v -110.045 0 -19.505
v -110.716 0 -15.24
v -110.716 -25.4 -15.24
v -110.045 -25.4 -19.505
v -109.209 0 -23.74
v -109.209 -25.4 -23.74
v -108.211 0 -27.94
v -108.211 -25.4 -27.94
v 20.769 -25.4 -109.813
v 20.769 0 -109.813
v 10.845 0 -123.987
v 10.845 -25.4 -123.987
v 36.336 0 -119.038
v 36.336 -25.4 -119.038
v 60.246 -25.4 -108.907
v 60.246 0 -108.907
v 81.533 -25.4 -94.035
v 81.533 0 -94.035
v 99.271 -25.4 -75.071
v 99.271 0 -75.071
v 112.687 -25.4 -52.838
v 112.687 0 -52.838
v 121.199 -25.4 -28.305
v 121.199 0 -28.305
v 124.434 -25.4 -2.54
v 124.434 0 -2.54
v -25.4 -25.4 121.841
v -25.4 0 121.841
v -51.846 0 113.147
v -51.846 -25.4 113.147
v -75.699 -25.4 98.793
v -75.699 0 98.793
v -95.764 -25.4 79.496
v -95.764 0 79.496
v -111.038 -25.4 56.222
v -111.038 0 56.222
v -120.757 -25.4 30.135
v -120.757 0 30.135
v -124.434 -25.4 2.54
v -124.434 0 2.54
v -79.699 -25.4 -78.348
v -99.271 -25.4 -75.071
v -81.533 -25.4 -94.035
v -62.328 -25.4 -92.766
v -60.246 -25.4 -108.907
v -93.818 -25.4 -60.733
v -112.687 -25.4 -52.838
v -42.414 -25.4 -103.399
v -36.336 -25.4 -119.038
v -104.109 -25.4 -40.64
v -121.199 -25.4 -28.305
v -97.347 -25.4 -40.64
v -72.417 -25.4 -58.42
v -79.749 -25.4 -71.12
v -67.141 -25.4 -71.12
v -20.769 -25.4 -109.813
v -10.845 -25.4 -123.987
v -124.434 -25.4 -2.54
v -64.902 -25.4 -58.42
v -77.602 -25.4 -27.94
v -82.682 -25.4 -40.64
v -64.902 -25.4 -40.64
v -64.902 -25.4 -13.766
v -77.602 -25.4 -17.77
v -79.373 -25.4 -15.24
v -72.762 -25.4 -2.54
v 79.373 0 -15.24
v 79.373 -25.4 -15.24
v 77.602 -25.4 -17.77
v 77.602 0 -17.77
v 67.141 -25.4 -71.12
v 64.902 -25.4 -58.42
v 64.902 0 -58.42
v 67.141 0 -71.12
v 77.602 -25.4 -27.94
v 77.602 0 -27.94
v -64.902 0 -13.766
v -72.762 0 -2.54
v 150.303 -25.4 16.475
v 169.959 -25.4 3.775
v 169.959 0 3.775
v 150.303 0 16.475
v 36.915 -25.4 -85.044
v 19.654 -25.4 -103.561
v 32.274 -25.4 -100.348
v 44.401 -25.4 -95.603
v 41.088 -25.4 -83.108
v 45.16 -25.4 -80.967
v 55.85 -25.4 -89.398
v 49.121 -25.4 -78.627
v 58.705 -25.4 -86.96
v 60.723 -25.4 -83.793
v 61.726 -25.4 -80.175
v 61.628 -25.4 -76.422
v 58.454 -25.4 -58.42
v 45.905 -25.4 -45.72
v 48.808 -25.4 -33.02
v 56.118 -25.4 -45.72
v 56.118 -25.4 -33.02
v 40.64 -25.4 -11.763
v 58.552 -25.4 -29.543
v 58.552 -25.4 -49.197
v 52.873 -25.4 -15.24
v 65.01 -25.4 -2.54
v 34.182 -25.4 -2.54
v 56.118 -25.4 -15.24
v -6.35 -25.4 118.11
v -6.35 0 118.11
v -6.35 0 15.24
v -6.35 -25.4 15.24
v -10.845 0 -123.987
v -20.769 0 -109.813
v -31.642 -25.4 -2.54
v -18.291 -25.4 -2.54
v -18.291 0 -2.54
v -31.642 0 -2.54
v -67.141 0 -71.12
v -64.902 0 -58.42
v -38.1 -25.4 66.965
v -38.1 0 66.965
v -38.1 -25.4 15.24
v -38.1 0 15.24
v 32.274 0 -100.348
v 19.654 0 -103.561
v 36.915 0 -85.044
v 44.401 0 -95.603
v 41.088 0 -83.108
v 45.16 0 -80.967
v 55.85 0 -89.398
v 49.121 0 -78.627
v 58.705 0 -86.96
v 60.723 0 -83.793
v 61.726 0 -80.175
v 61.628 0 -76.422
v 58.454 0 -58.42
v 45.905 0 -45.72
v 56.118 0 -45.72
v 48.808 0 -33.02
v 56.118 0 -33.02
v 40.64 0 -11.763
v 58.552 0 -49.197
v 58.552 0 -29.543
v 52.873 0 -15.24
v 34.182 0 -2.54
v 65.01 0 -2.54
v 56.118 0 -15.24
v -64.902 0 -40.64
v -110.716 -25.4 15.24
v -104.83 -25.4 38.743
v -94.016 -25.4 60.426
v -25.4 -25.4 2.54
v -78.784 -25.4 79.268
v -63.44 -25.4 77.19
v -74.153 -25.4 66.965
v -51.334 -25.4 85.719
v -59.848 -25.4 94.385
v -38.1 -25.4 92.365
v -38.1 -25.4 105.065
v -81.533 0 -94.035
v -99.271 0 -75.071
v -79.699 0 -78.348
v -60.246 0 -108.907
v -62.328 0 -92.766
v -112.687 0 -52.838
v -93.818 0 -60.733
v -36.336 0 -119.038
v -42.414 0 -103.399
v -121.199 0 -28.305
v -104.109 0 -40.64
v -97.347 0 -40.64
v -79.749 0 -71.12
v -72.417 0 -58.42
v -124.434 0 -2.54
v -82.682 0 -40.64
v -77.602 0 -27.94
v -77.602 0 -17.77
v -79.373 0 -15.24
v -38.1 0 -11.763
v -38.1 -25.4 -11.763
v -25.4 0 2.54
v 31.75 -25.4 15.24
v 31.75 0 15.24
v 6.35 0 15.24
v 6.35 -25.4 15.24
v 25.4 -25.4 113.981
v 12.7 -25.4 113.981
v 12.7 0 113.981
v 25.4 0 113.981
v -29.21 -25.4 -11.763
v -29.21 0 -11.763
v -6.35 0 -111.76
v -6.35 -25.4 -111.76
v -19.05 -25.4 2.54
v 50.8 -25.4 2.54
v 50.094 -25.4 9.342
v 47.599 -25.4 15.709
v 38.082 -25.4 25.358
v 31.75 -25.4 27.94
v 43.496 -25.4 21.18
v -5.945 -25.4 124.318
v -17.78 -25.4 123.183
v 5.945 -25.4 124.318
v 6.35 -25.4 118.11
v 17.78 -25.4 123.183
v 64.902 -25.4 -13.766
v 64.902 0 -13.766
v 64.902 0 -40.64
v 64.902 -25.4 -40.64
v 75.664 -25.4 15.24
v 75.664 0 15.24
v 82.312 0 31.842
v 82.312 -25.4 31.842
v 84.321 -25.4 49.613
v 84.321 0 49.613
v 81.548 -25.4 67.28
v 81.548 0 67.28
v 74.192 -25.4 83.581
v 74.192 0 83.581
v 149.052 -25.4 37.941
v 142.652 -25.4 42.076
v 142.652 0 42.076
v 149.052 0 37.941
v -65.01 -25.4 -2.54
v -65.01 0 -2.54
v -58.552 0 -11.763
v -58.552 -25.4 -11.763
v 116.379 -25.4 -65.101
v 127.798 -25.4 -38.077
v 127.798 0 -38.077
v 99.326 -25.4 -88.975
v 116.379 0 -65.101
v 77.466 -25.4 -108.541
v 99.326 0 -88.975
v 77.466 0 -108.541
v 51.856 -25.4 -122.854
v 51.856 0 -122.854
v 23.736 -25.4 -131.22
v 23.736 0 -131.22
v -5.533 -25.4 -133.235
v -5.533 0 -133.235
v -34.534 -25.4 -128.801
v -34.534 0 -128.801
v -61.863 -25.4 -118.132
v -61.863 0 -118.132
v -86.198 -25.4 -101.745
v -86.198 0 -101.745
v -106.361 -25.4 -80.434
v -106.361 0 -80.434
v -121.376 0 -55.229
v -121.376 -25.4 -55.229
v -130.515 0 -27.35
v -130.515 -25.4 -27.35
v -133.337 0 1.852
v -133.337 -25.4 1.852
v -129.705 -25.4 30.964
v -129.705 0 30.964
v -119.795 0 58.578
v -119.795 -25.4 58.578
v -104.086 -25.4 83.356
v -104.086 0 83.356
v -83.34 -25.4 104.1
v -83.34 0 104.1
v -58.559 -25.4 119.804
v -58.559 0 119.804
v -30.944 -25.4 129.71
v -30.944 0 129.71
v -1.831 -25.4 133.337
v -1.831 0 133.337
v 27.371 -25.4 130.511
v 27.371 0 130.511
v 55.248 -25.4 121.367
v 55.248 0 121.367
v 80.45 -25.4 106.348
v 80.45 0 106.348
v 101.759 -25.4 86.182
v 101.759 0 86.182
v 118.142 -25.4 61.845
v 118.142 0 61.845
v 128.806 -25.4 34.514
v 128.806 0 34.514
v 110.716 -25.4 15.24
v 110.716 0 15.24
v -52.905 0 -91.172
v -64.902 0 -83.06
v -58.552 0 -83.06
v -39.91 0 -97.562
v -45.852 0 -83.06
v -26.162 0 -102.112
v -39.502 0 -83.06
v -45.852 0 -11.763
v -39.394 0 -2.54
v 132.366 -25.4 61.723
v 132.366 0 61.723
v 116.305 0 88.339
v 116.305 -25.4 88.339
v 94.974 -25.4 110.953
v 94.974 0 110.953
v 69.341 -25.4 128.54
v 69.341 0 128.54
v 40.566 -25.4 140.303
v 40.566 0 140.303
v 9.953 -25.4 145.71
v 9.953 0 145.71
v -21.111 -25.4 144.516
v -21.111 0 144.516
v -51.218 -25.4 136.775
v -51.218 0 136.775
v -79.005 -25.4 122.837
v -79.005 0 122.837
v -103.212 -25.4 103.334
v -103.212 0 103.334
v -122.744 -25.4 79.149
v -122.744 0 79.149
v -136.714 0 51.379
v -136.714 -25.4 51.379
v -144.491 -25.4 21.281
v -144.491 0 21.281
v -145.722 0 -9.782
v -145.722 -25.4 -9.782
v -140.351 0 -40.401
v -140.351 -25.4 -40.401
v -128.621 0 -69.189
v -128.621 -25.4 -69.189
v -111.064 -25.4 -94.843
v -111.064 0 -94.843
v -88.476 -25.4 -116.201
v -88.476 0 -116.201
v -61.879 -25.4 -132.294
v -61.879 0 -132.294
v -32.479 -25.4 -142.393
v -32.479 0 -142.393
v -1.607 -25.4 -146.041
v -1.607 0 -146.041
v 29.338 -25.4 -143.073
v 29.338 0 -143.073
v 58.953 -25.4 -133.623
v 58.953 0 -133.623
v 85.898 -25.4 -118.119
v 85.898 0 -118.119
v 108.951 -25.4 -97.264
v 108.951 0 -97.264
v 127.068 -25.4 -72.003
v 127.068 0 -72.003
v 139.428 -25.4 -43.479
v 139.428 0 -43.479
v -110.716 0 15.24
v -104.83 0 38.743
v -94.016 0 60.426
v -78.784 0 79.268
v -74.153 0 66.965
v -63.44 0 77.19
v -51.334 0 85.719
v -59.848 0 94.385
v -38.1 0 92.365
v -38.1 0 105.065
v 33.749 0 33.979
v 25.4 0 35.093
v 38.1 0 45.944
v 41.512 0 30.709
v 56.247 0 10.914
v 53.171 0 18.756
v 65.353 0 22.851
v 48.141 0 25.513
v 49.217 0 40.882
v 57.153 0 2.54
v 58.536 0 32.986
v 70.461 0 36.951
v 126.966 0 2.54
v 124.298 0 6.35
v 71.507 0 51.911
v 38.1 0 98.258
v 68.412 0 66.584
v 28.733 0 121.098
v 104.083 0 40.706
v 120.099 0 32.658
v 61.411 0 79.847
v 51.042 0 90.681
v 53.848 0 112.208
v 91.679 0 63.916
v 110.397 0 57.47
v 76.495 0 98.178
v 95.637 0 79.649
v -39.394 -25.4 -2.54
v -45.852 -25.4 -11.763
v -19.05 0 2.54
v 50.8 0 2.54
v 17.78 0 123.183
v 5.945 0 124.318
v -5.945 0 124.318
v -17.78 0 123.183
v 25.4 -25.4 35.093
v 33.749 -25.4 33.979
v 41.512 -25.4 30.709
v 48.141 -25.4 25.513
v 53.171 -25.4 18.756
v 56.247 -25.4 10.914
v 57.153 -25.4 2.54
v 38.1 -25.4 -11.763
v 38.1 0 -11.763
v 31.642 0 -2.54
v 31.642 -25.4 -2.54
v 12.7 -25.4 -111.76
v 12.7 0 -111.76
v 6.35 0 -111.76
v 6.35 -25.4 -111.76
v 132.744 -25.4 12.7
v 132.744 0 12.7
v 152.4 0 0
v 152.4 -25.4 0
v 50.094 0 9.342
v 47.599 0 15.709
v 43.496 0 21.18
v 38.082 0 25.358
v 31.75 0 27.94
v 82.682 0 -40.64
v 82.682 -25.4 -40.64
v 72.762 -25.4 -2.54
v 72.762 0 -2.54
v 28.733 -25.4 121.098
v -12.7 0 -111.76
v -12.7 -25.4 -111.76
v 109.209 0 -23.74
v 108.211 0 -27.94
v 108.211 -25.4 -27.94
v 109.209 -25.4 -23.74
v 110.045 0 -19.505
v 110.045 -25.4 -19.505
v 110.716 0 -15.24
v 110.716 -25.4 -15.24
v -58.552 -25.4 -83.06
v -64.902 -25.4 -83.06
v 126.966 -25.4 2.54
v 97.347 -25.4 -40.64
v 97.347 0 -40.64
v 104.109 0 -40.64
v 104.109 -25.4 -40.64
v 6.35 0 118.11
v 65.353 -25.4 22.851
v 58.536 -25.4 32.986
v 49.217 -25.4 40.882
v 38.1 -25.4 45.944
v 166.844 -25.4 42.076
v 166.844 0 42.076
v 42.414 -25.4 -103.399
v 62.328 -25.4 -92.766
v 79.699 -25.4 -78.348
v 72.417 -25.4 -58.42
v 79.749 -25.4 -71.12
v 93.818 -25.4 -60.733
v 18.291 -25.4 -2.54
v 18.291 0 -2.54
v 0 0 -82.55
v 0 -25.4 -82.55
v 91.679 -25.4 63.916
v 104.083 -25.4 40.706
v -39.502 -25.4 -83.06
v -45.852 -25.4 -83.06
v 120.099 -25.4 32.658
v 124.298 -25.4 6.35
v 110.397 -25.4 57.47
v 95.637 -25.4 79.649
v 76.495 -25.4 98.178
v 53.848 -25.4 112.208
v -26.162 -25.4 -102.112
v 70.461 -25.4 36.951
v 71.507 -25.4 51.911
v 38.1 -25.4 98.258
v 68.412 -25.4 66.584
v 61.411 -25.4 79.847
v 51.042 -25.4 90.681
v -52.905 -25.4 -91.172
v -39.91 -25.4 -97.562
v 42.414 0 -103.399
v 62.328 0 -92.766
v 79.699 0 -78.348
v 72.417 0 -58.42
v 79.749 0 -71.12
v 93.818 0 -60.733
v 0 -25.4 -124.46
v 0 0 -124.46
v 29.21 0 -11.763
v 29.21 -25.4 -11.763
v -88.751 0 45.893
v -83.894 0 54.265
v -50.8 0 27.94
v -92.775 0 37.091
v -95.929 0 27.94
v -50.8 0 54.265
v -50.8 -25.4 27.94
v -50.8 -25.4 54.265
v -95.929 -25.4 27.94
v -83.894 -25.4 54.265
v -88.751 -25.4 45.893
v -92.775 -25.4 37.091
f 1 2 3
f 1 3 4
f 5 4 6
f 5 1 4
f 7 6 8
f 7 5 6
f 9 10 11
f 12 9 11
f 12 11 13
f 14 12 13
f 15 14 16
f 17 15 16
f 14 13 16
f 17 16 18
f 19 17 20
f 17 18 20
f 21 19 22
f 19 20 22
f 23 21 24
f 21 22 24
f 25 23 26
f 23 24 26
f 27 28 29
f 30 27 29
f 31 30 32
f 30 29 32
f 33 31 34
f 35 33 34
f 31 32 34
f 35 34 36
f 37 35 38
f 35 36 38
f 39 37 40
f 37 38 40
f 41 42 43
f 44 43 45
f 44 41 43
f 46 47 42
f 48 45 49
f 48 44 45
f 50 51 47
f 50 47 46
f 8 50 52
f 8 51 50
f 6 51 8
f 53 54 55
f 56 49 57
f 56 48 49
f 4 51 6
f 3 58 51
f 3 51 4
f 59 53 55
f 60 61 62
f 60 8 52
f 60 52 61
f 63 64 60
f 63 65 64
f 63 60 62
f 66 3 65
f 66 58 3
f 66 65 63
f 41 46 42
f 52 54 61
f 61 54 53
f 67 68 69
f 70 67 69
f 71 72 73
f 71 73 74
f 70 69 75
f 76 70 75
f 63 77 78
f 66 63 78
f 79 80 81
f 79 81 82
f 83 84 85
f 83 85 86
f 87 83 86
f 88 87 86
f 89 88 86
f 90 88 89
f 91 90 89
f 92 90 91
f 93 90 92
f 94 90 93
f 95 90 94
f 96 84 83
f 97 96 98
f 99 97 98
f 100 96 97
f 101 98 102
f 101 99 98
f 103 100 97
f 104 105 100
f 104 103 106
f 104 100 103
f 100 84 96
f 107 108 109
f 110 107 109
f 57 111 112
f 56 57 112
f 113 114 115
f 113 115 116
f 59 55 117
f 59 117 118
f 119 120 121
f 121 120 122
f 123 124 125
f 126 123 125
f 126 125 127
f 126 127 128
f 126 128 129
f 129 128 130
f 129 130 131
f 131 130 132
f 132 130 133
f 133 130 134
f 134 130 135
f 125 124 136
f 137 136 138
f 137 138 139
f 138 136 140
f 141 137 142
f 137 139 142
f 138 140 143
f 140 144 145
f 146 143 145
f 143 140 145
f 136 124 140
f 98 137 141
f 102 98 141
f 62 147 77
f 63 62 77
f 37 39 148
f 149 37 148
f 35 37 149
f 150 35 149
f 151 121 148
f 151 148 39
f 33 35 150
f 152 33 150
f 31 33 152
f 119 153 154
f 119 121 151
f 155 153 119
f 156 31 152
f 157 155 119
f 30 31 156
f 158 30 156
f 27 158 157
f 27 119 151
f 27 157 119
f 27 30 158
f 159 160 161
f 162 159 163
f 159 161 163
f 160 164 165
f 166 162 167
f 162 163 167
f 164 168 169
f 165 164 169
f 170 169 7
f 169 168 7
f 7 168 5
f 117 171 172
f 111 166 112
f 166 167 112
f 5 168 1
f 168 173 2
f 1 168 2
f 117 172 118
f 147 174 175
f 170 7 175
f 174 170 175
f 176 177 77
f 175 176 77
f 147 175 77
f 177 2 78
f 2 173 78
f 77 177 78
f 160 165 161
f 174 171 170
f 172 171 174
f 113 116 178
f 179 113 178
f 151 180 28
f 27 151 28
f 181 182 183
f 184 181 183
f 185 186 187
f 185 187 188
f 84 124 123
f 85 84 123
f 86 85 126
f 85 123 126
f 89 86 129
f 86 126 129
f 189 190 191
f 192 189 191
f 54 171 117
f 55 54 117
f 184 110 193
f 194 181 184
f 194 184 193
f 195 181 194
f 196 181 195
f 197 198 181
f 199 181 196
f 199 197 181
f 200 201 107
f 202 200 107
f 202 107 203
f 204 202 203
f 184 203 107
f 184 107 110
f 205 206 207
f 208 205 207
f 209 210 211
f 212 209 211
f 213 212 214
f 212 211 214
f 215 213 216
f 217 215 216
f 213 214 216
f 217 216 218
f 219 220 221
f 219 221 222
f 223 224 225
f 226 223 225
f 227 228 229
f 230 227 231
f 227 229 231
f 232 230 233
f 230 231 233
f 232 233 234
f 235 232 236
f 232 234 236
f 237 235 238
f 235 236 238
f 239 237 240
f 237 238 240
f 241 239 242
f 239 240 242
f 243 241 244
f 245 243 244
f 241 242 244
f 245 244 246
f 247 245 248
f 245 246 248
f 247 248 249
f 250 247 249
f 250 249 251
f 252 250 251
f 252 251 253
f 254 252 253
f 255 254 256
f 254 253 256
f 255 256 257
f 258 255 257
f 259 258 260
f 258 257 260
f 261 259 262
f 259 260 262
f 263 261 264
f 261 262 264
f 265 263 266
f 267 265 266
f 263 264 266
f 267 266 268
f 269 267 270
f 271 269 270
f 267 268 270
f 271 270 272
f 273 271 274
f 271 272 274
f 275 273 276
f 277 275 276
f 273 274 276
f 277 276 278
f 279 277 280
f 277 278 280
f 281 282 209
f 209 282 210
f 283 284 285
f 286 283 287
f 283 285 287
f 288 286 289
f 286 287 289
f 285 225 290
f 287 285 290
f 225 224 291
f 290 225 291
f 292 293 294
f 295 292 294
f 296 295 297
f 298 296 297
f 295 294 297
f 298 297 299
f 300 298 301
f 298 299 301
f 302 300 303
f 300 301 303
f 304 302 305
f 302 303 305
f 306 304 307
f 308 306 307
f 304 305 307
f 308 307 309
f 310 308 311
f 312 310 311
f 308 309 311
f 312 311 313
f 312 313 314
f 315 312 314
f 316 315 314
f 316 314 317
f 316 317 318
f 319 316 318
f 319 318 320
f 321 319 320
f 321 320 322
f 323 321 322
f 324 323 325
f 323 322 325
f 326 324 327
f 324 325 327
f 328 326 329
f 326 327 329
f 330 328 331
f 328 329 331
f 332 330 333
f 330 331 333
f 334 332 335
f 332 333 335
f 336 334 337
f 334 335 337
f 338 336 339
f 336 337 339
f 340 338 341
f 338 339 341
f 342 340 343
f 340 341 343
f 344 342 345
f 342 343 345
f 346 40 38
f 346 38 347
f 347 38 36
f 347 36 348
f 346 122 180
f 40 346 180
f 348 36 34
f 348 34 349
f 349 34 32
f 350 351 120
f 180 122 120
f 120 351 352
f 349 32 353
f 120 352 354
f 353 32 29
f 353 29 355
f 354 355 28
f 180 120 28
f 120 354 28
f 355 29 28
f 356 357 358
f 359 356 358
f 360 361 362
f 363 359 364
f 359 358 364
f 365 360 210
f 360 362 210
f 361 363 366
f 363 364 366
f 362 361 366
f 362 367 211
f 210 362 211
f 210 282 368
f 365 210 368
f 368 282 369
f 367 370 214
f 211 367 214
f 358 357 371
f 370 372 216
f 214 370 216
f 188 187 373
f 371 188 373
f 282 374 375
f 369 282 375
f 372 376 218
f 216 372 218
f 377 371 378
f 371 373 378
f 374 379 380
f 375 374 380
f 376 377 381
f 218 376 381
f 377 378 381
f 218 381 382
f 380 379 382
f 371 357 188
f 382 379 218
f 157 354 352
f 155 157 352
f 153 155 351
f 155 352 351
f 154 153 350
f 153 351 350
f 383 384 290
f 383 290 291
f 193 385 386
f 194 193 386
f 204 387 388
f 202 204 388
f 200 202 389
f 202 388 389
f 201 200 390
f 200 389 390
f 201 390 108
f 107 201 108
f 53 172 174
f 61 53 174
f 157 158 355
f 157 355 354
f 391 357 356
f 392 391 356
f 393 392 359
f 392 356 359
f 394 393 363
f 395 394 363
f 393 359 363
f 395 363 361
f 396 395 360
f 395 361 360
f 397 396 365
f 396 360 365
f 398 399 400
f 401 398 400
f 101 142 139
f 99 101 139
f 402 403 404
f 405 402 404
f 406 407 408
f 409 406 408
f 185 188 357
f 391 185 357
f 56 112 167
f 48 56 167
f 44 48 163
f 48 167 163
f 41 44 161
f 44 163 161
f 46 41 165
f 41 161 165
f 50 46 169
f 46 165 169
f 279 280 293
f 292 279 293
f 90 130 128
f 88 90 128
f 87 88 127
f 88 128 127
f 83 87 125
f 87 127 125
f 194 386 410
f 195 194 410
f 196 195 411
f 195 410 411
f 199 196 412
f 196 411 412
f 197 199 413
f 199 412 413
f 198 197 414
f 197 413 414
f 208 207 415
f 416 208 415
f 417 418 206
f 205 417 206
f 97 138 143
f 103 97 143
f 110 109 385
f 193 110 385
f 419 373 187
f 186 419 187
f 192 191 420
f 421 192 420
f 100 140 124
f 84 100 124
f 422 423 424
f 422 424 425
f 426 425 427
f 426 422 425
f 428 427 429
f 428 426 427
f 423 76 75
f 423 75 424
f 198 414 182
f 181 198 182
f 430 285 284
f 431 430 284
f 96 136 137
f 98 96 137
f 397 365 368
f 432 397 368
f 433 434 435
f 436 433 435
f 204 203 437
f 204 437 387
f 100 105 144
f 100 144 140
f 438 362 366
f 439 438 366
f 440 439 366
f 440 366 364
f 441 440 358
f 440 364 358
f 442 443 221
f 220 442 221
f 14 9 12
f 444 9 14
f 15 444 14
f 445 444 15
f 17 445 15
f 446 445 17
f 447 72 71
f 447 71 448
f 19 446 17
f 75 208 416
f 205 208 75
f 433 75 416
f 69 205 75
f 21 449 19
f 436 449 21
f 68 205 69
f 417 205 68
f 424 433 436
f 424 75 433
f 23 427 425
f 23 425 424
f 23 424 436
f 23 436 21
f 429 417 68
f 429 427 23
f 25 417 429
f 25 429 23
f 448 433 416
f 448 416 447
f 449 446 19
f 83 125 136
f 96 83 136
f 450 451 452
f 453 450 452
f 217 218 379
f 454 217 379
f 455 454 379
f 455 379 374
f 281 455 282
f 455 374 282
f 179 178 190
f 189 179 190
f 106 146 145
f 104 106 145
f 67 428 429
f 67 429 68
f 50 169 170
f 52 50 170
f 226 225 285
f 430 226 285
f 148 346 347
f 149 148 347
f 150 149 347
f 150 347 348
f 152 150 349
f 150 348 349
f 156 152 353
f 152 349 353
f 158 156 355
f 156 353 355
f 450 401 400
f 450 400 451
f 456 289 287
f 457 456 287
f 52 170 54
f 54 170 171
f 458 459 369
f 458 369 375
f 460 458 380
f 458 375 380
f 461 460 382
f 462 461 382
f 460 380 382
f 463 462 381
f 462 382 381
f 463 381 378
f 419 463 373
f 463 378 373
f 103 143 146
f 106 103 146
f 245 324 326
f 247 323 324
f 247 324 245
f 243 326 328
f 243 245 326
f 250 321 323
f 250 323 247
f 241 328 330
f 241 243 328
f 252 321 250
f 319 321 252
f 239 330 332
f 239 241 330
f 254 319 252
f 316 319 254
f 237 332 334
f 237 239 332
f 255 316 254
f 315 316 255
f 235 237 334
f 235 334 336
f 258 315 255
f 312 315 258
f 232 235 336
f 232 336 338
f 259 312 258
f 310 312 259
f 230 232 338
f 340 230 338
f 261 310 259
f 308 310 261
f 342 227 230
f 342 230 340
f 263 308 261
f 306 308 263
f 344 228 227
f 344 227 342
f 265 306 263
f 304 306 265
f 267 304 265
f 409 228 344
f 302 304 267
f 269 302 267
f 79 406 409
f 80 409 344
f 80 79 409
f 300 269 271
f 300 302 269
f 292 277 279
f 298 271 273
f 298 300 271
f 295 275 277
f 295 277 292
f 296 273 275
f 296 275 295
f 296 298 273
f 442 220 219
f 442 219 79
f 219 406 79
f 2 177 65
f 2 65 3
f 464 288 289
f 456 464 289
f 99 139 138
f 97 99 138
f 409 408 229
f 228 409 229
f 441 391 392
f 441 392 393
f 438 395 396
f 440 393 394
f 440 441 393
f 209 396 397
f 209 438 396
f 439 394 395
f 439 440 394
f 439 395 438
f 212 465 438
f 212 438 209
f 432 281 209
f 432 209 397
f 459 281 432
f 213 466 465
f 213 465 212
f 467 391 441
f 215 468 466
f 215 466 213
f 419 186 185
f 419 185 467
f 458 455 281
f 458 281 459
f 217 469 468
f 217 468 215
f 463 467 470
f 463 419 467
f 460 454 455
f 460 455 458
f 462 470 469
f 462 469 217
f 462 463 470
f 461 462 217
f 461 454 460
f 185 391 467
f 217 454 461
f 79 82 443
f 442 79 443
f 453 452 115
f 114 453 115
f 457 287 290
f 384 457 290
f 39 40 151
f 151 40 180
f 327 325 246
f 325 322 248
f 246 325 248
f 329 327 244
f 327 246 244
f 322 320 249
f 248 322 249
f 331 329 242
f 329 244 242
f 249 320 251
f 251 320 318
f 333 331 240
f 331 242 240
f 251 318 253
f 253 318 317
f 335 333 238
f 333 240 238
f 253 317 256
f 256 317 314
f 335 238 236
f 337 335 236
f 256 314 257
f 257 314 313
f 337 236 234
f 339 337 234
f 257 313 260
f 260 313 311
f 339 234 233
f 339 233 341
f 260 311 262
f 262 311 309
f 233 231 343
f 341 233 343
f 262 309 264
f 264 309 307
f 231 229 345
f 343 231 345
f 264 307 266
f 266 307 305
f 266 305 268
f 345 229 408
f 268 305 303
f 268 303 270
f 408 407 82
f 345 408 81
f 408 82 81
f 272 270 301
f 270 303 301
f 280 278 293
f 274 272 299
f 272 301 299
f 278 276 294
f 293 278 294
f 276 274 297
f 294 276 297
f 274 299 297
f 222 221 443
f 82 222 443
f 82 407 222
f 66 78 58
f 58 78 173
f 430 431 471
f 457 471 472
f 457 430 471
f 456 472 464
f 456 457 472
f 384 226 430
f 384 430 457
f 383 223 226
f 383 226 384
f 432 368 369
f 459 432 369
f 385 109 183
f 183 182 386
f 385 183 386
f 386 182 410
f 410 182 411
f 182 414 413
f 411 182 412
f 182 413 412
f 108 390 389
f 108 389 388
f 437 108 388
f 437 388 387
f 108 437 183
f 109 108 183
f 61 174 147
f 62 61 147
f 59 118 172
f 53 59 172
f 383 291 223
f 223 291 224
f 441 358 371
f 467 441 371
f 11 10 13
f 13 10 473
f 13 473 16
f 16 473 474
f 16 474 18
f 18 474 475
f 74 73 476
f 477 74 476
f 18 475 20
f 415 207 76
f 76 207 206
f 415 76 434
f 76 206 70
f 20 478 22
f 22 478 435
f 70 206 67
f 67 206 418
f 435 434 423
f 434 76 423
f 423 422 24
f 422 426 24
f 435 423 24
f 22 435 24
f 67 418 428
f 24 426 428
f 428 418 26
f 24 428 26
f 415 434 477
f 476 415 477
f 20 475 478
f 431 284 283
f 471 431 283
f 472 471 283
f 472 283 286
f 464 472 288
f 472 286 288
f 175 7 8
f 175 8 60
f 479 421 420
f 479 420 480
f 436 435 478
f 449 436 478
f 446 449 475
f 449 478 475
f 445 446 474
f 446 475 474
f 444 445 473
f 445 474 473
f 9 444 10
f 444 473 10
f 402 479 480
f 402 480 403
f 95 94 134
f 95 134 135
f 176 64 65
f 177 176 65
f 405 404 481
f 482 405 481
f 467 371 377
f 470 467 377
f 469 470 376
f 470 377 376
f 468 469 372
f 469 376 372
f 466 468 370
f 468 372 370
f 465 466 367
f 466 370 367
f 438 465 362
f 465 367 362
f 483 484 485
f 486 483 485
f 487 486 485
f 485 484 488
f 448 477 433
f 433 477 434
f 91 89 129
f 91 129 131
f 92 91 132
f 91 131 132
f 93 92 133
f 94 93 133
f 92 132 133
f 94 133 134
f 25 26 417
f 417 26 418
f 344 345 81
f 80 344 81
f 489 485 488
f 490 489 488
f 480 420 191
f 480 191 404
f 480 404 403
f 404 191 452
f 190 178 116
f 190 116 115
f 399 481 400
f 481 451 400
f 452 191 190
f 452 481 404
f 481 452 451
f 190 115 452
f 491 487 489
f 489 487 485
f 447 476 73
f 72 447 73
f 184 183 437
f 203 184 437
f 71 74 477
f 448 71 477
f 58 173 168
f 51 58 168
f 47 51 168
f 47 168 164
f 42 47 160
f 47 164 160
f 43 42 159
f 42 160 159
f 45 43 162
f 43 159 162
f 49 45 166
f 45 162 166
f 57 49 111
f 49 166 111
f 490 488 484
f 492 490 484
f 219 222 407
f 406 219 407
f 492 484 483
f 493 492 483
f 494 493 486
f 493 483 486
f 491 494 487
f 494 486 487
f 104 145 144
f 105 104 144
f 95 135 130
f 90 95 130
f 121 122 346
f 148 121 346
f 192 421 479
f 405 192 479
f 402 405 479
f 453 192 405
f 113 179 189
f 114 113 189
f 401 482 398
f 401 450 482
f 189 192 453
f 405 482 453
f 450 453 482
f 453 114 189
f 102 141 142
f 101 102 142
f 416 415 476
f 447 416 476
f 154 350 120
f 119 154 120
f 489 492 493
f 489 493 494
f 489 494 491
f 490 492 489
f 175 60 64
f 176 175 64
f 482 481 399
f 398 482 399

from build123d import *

# Parameters (mm, degrees)
F3_DEPTH  = 25.4
F5_DEPTH  = 25.4
F6_DEPTH  = 25.4
F8_DEPTH  = 25.4
F10_DEPTH = 25.4
F12_DEPTH = 25.401
F14_DEPTH = 25.4
F16_DEPTH = 25.4
F18_DEPTH = 25.4
F20_R     = 84.4927612286
F21_DEPTH = 25.4


with BuildPart() as f3:
    # F1 (on Front) → F3 (new body)
    with BuildSketch(Plane.XZ):
        with BuildLine():
            ThreePointArc((-25.4, 121.8405991449), (-95.7638817172, 79.4957266679), (-124.4340789334, 2.54))
            Line((-124.4340789334, 2.54), (-25.4, 2.54))
            Line((-25.4, 2.54), (-25.4, 121.8405991449))
        make_face()
        with BuildLine():
            ThreePointArc((-110.7160331659, 15.24), (-86.9119826119, 70.2609769251), (-38.1, 105.0651588301))
            Line((-38.1, 105.0651588301), (-38.1, 92.3651588301))
            ThreePointArc((-38.1, 92.3651588301), (-57.5451867422, 81.679153084), (-74.1525459345, 66.9651588301))
            Line((-74.1525459345, 66.9651588301), (-38.1, 66.9651588301))
            Line((-38.1, 66.9651588301), (-38.1, 15.24))
            Line((-38.1, 15.24), (-110.7160331659, 15.24))
        make_face(mode=Mode.SUBTRACT)
    extrude(amount=F3_DEPTH)


with BuildPart() as f3b:
    # F1 (on Front) → F3, piece 2 (new body)
    with BuildSketch(Plane.XZ):
        with BuildLine():
            Line((6.35, 118.11), (17.78, 123.1834534343))
            ThreePointArc((17.78, 123.1834534343), (0, 124.46), (-17.78, 123.1834534343))
            Line((-17.78, 123.1834534343), (-6.35, 118.11))
            Line((-6.35, 118.11), (-6.35, 15.24))
            Line((-6.35, 15.24), (-19.05, 2.54))
            Line((-19.05, 2.54), (50.8, 2.54))
            ThreePointArc((50.8, 2.54), (45.7327050841, 18.5832788131), (31.75, 27.94))
            Line((31.75, 27.94), (31.75, 15.24))
            Line((31.75, 15.24), (6.35, 15.24))
            Line((6.35, 15.24), (6.35, 118.11))
        make_face()
    extrude(amount=F3_DEPTH)


with BuildPart() as f5:
    # F4 (on Front) → F5 (new body)
    with BuildSketch(Plane.XZ):
        with BuildLine():
            Line((-50.8, 27.94), (-50.8, 54.2651588301))
            Line((-50.8, 54.2651588301), (-83.8941303242, 54.2651588301))
            ThreePointArc((-83.8941303242, 54.2651588301), (-90.8697069766, 41.5406899281), (-95.9285617828, 27.94))
            Line((-95.9285617828, 27.94), (-50.8, 27.94))
        make_face()
    extrude(amount=F5_DEPTH)


with BuildPart() as f6:
    # F2 (on Front) → F6 (new body)
    with BuildSketch(Plane.XZ):
        with BuildLine():
            ThreePointArc((25.4, 35.093276271), (48.1411381908, 25.5126457077), (57.1525419322, 2.54))
            Line((57.1525419322, 2.54), (126.965695369, 2.54))
            Line((126.965695369, 2.54), (124.2979046485, 6.35))
            ThreePointArc((124.2979046485, 6.35), (95.636825538, 79.6485354606), (28.7332646793, 121.0978575404))
            Line((28.7332646793, 121.0978575404), (12.7, 113.9811452263))
            Line((12.7, 113.9811452263), (25.4, 113.9811452263))
            Line((25.4, 113.9811452263), (25.4, 35.093276271))
        make_face()
        with BuildLine():
            Line((38.1, 98.2576242415), (38.1, 105.0651588301))
            ThreePointArc((38.1, 105.0651588301), (57.1644375837, 96.0339766735), (74.1921715749, 83.5812136607))
            ThreePointArc((74.1921715749, 83.5812136607), (98.5666851237, 52.677378292), (110.7160331659, 15.24))
            Line((110.7160331659, 15.24), (75.6643674018, 15.24))
            Line((75.6643674018, 15.24), (68.2410896555, 15.24))
            ThreePointArc((68.2410896555, 15.24), (66.9718438263, 19.1116169311), (65.3534242126, 22.8507505995))
            ThreePointArc((65.3534242126, 22.8507505995), (54.1486294803, 37.2556533847), (38.1, 45.9441596457))
            Line((38.1, 45.9441596457), (38.1, 98.2576242415))
        make_face(mode=Mode.SUBTRACT)
    extrude(amount=F6_DEPTH)

    # F7 (on Front) → F8 (join)
    with BuildSketch(Plane.XZ):
        with BuildLine():
            ThreePointArc((38.1, 98.2576242415), (68.4115211867, 66.5843827835), (65.3534242126, 22.8507505995))
            ThreePointArc((65.3534242126, 22.8507505995), (66.9718438263, 19.1116169311), (68.2410896555, 15.24))
            Line((68.2410896555, 15.24), (75.6643674018, 15.24))
            ThreePointArc((75.6643674018, 15.24), (84.3210627234, 49.6129449257), (74.1921715749, 83.5812136607))
            ThreePointArc((74.1921715749, 83.5812136607), (57.1644375837, 96.0339766735), (38.1, 105.0651588301))
            Line((38.1, 105.0651588301), (38.1, 98.2576242415))
        make_face()
    extrude(amount=F8_DEPTH)


with BuildPart() as f10:
    # F9 (on Front) → F10 (new body)
    with BuildSketch(Plane.XZ):
        Polygon((-18.2909121905, -2.54), (-31.6416893331, -2.54), (-38.1, -11.7634235059), (-29.21, -11.7634235059), (-6.35, -111.76), (-12.7, -111.76), (0, -124.46), (12.7, -111.76), (6.35, -111.76), (29.21, -11.7634235059), (38.1, -11.7634235059), (31.6416893331, -2.54), (18.2909121905, -2.54), (0, -82.55), align=None)
    extrude(amount=F10_DEPTH)


with BuildPart() as f10b:
    # F9 (on Front) → F10, piece 2 (new body)
    with BuildSketch(Plane.XZ):
        with BuildLine():
            Line((-39.3936079717, -2.54), (-65.0102293056, -2.54))
            Line((-65.0102293056, -2.54), (-58.5519186386, -11.7634235059))
            Line((-58.5519186386, -11.7634235059), (-58.5519186386, -83.0602736392))
            Line((-58.5519186386, -83.0602736392), (-64.9019186386, -83.0602736392))
            ThreePointArc((-64.9019186386, -83.0602736392), (-46.5176770944, -94.5905588193), (-26.1618812897, -102.111821389))
            Line((-26.1618812897, -102.111821389), (-39.5019186386, -83.0602736392))
            Line((-39.5019186386, -83.0602736392), (-45.8519186386, -83.0602736392))
            Line((-45.8519186386, -83.0602736392), (-45.8519186386, -11.7634235059))
            Line((-45.8519186386, -11.7634235059), (-39.3936079717, -2.54))
        make_face()
    extrude(amount=F10_DEPTH)


with BuildPart() as f10c:
    # F9 (on Front) → F10, piece 3 (new body)
    with BuildSketch(Plane.XZ):
        with BuildLine():
            Line((-72.7621479442, -2.54), (-124.4340789334, -2.54))
            ThreePointArc((-124.4340789334, -2.54), (-90.8978891831, -85.0168532825), (-10.8449943843, -123.9866028924))
            Line((-10.8449943843, -123.9866028924), (-20.7693394721, -109.8131692371))
            ThreePointArc((-20.7693394721, -109.8131692371), (-71.3784490451, -85.9965965136), (-104.1090197821, -40.64))
            Line((-104.1090197821, -40.64), (-97.3466154761, -40.64))
            Line((-97.3466154761, -40.64), (-79.7489792712, -71.12))
            Line((-79.7489792712, -71.12), (-67.1412712936, -71.12))
            Line((-67.1412712936, -71.12), (-64.9019186386, -58.42))
            Line((-64.9019186386, -58.42), (-72.4166308524, -58.42))
            Line((-72.4166308524, -58.42), (-82.6819186386, -40.64))
            Line((-82.6819186386, -40.64), (-64.9019186386, -40.64))
            Line((-64.9019186386, -40.64), (-64.9019186386, -13.7655708153))
            Line((-64.9019186386, -13.7655708153), (-72.7621479442, -2.54))
        make_face()
    extrude(amount=F10_DEPTH)


with BuildPart() as f10d:
    # F9 (on Front) → F10, piece 4 (new body)
    with BuildSketch(Plane.XZ):
        with BuildLine():
            ThreePointArc((10.8449943843, -123.9866028924), (90.8978891831, -85.0168532825), (124.4340789334, -2.54))
            Line((124.4340789334, -2.54), (72.7621479442, -2.54))
            Line((72.7621479442, -2.54), (64.9019186386, -13.7655708153))
            Line((64.9019186386, -13.7655708153), (64.9019186386, -40.64))
            Line((64.9019186386, -40.64), (82.6819186386, -40.64))
            Line((82.6819186386, -40.64), (72.4166308524, -58.42))
            Line((72.4166308524, -58.42), (64.9019186386, -58.42))
            Line((64.9019186386, -58.42), (67.1412712936, -71.12))
            Line((67.1412712936, -71.12), (79.7489792712, -71.12))
            Line((79.7489792712, -71.12), (97.3466154761, -40.64))
            Line((97.3466154761, -40.64), (104.1090197821, -40.64))
            ThreePointArc((104.1090197821, -40.64), (71.3784490451, -85.9965965136), (20.7693394721, -109.8131692371))
            Line((20.7693394721, -109.8131692371), (10.8449943843, -123.9866028924))
        make_face()
    extrude(amount=F10_DEPTH)


with BuildPart() as f12_tool:
    # F11 (on Front) → F12 (new body, through all)
    with BuildSketch(Plane.XZ):
        with BuildLine():
            Line((-108.211154693, -27.94), (-77.6019186386, -27.94))
            Line((-77.6019186386, -27.94), (-77.6019186386, -17.769865434))
            Line((-77.6019186386, -17.769865434), (-79.3733494862, -15.24))
            Line((-79.3733494862, -15.24), (-110.7160331659, -15.24))
            ThreePointArc((-110.7160331659, -15.24), (-109.6476214788, -21.6262965864), (-108.211154693, -27.94))
        make_face()
        with BuildLine():
            Line((77.6019186386, -17.769865434), (77.6019186386, -27.94))
            Line((77.6019186386, -27.94), (108.211154693, -27.94))
            ThreePointArc((108.211154693, -27.94), (109.6476214788, -21.6262965864), (110.7160331659, -15.24))
            Line((110.7160331659, -15.24), (79.3733494862, -15.24))
            Line((79.3733494862, -15.24), (77.6019186386, -17.769865434))
        make_face()
    extrude(amount=F12_DEPTH)


with BuildPart() as f10c_1:
    add(f10c.part)

    # F12: cut by f12_tool
    add(f12_tool.part, mode=Mode.SUBTRACT)


with BuildPart() as f10d_1:
    add(f10d.part)

    # F12: cut by f12_tool
    add(f12_tool.part, mode=Mode.SUBTRACT)


with BuildPart() as f14:
    # F13 (on Front) → F14 (new body)
    with BuildSketch(Plane.XZ):
        with BuildLine():
            Line((34.1816893331, -2.54), (40.64, -11.7634235059))
            Line((40.64, -11.7634235059), (19.6542474744, -103.5614728372))
            ThreePointArc((19.6542474744, -103.5614728372), (38.4106078171, -98.1625860861), (55.8500632203, -89.3982020976))
            ThreePointArc((55.8500632203, -89.3982020976), (60.7229151187, -83.7934560073), (61.628198404, -76.4220025187))
            Line((61.628198404, -76.4220025187), (58.4539596532, -58.42))
            Line((58.4539596532, -58.42), (49.1211399407, -78.627334375))
            ThreePointArc((49.1211399407, -78.627334375), (43.1376370481, -82.0627099839), (36.9152168202, -85.043582163))
            Line((36.9152168202, -85.043582163), (45.9048954648, -45.72))
            Line((45.9048954648, -45.72), (56.1175935703, -45.72))
            Line((56.1175935703, -45.72), (58.5519186386, -49.1965764941))
            Line((58.5519186386, -49.1965764941), (58.5519186386, -29.5434235059))
            Line((58.5519186386, -29.5434235059), (56.1175935703, -33.02))
            Line((56.1175935703, -33.02), (48.8082148601, -33.02))
            Line((48.8082148601, -33.02), (52.8728620136, -15.24))
            Line((52.8728620136, -15.24), (56.1175935703, -15.24))
            Line((56.1175935703, -15.24), (65.0102293056, -2.54))
            Line((65.0102293056, -2.54), (34.1816893331, -2.54))
        make_face()
    extrude(amount=F14_DEPTH)


with BuildPart() as f16:
    # F15 (on Front) → F16 (new body)
    with BuildSketch(Plane.XZ):
        with BuildLine():
            Line((142.6519315761, 42.0762091864), (149.0522291178, 37.9409230564))
            Line((149.0522291178, 37.9409230564), (132.7438562111, 12.7))
            Line((132.7438562111, 12.7), (152.4, 0))
            Line((152.4, 0), (127.798140427, -38.0769834047))
            ThreePointArc((127.798140427, -38.0769834047), (-133.3371393983, 1.851653012), (128.8062048134, 34.5135185599))
            Line((128.8062048134, 34.5135185599), (132.3662484289, 61.7233953236))
            ThreePointArc((132.3662484289, 61.7233953236), (-145.7220677411, -9.7816269946), (139.4279929117, -43.4791449551))
            Line((139.4279929117, -43.4791449551), (169.9593061196, 3.7750190195))
            Line((169.9593061196, 3.7750190195), (150.3031623308, 16.4750190195))
            Line((150.3031623308, 16.4750190195), (166.8443068509, 42.0762091864))
            Line((166.8443068509, 42.0762091864), (142.6519315761, 42.0762091864))
        make_face()
    extrude(amount=F16_DEPTH)


with BuildPart() as f18:
    # F17 (on Front) → F18 (new body)
    with BuildSketch(Plane.XZ):
        with BuildLine():
            ThreePointArc((-132.3377700257, 128.054424183), (-138.9190287599, 120.8831021137), (-145.1121769137, 113.3740580538))
            Line((-145.1121769137, 113.3740580538), (-140.1082996406, 109.4646006635))
            ThreePointArc((-140.1082996406, 109.4646006635), (-134.1287087082, 116.7147116986), (-127.7743903432, 123.6387463501))
            Line((-127.7743903432, 123.6387463501), (-120.4730041622, 116.5736824385))
            ThreePointArc((-120.4730041622, 116.5736824385), (-124.5244024675, 112.2356510171), (-128.4196871752, 107.7569121446))
            Line((-128.4196871752, 107.7569121446), (-113.8265405338, 95.5118081801))
            ThreePointArc((-113.8265405338, 95.5118081801), (-109.5520363301, 100.3859460664), (-105.0689935988, 105.0689935988))
            Line((-105.0689935988, 105.0689935988), (-109.5591195946, 109.5591195946))
            ThreePointArc((-109.5591195946, 109.5591195946), (-112.0642999001, 106.9952992453), (-114.5094992977, 104.3742111025))
            Line((-114.5094992977, 104.3742111025), (-119.3778151515, 108.4592131398))
            ThreePointArc((-119.3778151515, 108.4592131398), (-116.7469957969, 111.2861295834), (-114.0492517846, 114.0492517846))
            Line((-114.0492517846, 114.0492517846), (-136.4998900225, 136.4998900225))
            ThreePointArc((-136.4998900225, 136.4998900225), (-137.6178439353, 135.3727039803), (-138.726490106, 134.2363620455))
            Line((-138.726490106, 134.2363620455), (-132.3377700257, 128.054424183))
        make_face()
    extrude(amount=F18_DEPTH)

    # F19: F18 across face


with BuildPart() as f18_1:
    add(f18.part)
    add(f18.part.mirror(Plane(origin=(-125.2745709036, -12.7, 125.2745709036), x_dir=(0, 1, 0), z_dir=(0.7071067812, 0, 0.7071067812))))

    # F20 (on Front) → F21 (cut)
    with BuildSketch(Plane.XZ):
        with Locations((-157.50195086, 149.4678705931)):
            Circle(F20_R)
    extrude(amount=F21_DEPTH, mode=Mode.SUBTRACT)


solid = Compound([f3.part, f3b.part, f5.part, f6.part, f10.part, f10b.part, f10c_1.part, f10d_1.part, f14.part, f16.part])
